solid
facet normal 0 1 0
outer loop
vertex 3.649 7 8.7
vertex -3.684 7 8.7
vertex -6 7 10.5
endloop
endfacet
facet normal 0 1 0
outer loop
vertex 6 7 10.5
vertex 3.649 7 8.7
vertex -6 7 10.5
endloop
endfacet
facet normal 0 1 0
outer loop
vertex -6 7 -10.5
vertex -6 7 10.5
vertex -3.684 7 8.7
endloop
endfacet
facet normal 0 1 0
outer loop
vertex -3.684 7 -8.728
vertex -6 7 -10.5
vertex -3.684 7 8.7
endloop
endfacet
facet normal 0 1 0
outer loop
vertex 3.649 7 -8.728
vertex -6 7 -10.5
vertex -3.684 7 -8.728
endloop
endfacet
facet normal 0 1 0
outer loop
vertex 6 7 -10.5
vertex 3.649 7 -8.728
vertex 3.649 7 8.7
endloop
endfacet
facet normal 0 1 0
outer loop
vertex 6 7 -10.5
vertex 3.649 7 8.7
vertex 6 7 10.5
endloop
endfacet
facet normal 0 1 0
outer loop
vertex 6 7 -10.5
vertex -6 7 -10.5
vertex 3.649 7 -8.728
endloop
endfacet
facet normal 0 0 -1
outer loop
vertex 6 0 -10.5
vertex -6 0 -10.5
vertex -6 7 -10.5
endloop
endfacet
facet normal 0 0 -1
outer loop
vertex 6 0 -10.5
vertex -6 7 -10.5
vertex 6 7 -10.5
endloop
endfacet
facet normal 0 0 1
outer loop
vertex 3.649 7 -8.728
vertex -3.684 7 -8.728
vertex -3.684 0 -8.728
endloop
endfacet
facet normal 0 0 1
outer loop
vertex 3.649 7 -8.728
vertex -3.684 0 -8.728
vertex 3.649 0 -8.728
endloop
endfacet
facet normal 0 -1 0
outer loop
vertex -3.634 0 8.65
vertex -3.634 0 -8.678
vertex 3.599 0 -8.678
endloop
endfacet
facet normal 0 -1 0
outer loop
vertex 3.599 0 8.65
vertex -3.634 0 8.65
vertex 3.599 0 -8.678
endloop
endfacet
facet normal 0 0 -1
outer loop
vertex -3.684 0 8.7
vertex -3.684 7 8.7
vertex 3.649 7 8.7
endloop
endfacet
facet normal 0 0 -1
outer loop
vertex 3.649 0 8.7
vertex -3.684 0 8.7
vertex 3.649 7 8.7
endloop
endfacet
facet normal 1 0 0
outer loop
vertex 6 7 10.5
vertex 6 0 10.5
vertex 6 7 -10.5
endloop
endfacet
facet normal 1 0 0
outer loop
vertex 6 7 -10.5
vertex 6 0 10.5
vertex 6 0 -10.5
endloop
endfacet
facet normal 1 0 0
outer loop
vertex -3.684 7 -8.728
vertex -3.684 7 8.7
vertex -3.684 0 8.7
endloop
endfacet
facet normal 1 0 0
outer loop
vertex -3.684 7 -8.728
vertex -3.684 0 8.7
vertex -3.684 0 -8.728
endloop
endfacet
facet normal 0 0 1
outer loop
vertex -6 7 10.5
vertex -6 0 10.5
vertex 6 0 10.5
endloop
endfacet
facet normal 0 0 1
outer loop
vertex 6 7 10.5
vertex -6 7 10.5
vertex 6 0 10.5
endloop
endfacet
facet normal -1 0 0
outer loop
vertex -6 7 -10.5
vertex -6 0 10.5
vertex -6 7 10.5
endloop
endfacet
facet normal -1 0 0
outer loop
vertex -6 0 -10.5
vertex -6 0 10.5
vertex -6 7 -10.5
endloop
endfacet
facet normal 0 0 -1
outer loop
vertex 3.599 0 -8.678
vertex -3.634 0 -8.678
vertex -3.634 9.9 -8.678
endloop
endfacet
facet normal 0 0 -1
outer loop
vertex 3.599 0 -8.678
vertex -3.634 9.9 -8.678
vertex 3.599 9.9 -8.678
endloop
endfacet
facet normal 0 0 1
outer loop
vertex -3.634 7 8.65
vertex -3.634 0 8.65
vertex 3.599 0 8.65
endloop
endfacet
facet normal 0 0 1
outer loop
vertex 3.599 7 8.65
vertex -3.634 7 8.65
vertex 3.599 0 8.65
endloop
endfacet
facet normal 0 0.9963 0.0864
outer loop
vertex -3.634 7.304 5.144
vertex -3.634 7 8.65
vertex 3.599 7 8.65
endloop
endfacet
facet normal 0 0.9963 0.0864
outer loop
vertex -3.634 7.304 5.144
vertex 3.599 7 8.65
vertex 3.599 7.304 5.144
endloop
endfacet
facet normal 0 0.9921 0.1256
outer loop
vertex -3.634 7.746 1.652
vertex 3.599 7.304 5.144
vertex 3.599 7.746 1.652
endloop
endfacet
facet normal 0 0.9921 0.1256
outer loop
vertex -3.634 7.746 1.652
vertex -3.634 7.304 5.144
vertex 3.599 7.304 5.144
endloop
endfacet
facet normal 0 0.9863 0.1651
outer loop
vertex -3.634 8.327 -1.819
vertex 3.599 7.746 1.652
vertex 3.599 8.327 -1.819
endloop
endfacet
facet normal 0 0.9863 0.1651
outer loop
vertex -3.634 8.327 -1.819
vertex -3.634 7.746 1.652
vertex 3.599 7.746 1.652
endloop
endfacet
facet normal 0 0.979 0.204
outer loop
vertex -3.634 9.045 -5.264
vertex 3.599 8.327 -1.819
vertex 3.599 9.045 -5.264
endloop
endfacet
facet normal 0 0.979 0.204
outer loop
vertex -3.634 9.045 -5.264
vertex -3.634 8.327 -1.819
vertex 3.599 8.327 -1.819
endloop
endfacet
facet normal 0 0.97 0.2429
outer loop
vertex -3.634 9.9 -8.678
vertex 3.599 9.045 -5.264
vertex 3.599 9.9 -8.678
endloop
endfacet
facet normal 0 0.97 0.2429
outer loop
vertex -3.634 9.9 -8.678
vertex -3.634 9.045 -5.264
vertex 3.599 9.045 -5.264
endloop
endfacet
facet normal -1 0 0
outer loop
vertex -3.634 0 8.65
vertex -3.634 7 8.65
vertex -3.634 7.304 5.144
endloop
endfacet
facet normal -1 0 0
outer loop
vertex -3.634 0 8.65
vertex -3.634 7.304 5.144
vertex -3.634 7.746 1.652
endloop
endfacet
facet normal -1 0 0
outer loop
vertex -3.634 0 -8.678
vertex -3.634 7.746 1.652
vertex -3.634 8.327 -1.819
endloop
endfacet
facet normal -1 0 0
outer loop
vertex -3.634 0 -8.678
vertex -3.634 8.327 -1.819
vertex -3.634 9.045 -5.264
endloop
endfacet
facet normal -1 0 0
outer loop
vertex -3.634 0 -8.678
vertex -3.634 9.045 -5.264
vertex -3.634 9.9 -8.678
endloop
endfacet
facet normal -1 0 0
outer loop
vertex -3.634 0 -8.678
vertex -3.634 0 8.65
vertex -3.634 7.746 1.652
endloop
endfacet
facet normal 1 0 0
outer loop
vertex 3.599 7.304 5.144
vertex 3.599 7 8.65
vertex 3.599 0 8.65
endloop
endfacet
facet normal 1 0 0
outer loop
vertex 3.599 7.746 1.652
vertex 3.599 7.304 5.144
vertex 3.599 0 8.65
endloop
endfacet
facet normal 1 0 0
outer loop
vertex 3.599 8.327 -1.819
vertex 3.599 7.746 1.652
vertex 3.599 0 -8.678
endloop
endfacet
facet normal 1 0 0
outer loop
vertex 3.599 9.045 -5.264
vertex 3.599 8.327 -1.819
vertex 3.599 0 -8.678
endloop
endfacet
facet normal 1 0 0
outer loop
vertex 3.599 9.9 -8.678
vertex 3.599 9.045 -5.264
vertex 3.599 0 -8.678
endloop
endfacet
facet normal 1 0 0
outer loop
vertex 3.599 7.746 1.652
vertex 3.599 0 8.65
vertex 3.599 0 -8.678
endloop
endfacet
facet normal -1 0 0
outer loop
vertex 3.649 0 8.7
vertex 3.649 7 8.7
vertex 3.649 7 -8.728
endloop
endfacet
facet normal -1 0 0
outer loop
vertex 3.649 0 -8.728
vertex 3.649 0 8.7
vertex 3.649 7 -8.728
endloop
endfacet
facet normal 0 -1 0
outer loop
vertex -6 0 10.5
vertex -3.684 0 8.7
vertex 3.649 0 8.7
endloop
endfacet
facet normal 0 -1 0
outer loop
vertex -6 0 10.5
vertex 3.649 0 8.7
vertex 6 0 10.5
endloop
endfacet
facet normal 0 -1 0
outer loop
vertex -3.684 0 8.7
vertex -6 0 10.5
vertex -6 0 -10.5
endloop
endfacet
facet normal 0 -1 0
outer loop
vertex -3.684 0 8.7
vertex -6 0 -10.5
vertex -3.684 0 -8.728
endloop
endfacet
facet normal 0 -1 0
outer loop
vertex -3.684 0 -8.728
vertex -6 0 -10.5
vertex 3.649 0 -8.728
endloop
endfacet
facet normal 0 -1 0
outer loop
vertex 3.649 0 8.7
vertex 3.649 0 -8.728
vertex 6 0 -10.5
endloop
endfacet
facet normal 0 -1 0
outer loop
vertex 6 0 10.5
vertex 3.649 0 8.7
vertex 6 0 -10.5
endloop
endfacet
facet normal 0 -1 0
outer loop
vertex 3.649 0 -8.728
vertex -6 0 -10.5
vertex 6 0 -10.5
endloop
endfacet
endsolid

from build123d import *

# Parameters (mm, degrees)
SKETCH1_W           = 12
SKETCH1_H           = 21
BOSS_EXTRUDE1_DEPTH = 7
SKETCH3_W           = 7.332600984
SKETCH3_H           = 17.427465336
SKETCH3_W_2         = 7.232600984
SKETCH3_H_2         = 17.327465336
CUT_EXTRUDE1_DEPTH  = 7
SKETCH4_W           = 7.232600984
SKETCH4_H           = 17.327465336
BOSS_EXTRUDE3_DEPTH = 7
CUT_EXTRUDE3_START  = -7.232600984
CUT_EXTRUDE3_DEPTH  = 7.232600984


# Read off the part's stored shape, not the designer's step: Cut-Extrude3
with BuildPart() as part:
    # Sketch1 → Boss-Extrude1 (new body)
    with BuildSketch(Plane(origin=(0, 0, 0), x_dir=(1, 0, 0), z_dir=(0, 1, 0))):
        Rectangle(SKETCH1_W, SKETCH1_H)
    extrude(amount=BOSS_EXTRUDE1_DEPTH)

    # Sketch3 → Cut-Extrude1 (cut)
    with BuildSketch(Plane(origin=(0, 7, 0), x_dir=(1, 0, 0), z_dir=(0, 1, 0))):
        with Locations((-0.017596075, 0.014058571)):
            Rectangle(SKETCH3_W, SKETCH3_H)
        with Locations((-0.017596075, 0.014058571)):
            Rectangle(SKETCH3_W_2, SKETCH3_H_2, mode=Mode.SUBTRACT)
    extrude(amount=-CUT_EXTRUDE1_DEPTH, mode=Mode.SUBTRACT)


with BuildPart() as cut_extrude1_piece_1:
    # of the separate pieces the step leaves, piece 1, a body of its own (cut_extrude1_pieces)
    add(part.part.solids().sort_by_distance((3.598704417, 0, 8.649674097))[0])

    # Sketch4 → Boss-Extrude3 (add)
    with BuildSketch(Plane(origin=(0, 7, 0), x_dir=(1, 0, 0), z_dir=(0, 1, 0))):
        with Locations((-0.017596075, 0.014058571)):
            Rectangle(SKETCH4_W, SKETCH4_H)
    extrude(amount=BOSS_EXTRUDE3_DEPTH)

    # Cut-Extrude3 outline → Cut-Extrude3 (cut)
    with BuildSketch(Plane(origin=(3.598704417, 0, 0), x_dir=(0, 0, -1), z_dir=(1, 0, 0)).offset(CUT_EXTRUDE3_START)):
        with BuildLine():
            Line((-8.649674097, 14), (-8.649674097, 7.000001761))
            ThreePointArc((-8.649674097, 7.000001761), (0.086046227, 8.019591461), (8.677791239, 9.89956231))
            Line((8.677791239, 9.89956231), (8.677791239, 14))
            Line((8.677791239, 14), (-8.649674097, 14))
        make_face()
    extrude(amount=CUT_EXTRUDE3_DEPTH, mode=Mode.SUBTRACT)


with BuildPart() as cut_extrude1_piece_2:
    # of the separate pieces the step leaves, piece 2, a body of its own (cut_extrude1_pieces)
    add(part.part.solids().sort_by_distance((-6, 0, -10.5))[0])


solid = Compound([cut_extrude1_piece_1.part, cut_extrude1_piece_2.part])
